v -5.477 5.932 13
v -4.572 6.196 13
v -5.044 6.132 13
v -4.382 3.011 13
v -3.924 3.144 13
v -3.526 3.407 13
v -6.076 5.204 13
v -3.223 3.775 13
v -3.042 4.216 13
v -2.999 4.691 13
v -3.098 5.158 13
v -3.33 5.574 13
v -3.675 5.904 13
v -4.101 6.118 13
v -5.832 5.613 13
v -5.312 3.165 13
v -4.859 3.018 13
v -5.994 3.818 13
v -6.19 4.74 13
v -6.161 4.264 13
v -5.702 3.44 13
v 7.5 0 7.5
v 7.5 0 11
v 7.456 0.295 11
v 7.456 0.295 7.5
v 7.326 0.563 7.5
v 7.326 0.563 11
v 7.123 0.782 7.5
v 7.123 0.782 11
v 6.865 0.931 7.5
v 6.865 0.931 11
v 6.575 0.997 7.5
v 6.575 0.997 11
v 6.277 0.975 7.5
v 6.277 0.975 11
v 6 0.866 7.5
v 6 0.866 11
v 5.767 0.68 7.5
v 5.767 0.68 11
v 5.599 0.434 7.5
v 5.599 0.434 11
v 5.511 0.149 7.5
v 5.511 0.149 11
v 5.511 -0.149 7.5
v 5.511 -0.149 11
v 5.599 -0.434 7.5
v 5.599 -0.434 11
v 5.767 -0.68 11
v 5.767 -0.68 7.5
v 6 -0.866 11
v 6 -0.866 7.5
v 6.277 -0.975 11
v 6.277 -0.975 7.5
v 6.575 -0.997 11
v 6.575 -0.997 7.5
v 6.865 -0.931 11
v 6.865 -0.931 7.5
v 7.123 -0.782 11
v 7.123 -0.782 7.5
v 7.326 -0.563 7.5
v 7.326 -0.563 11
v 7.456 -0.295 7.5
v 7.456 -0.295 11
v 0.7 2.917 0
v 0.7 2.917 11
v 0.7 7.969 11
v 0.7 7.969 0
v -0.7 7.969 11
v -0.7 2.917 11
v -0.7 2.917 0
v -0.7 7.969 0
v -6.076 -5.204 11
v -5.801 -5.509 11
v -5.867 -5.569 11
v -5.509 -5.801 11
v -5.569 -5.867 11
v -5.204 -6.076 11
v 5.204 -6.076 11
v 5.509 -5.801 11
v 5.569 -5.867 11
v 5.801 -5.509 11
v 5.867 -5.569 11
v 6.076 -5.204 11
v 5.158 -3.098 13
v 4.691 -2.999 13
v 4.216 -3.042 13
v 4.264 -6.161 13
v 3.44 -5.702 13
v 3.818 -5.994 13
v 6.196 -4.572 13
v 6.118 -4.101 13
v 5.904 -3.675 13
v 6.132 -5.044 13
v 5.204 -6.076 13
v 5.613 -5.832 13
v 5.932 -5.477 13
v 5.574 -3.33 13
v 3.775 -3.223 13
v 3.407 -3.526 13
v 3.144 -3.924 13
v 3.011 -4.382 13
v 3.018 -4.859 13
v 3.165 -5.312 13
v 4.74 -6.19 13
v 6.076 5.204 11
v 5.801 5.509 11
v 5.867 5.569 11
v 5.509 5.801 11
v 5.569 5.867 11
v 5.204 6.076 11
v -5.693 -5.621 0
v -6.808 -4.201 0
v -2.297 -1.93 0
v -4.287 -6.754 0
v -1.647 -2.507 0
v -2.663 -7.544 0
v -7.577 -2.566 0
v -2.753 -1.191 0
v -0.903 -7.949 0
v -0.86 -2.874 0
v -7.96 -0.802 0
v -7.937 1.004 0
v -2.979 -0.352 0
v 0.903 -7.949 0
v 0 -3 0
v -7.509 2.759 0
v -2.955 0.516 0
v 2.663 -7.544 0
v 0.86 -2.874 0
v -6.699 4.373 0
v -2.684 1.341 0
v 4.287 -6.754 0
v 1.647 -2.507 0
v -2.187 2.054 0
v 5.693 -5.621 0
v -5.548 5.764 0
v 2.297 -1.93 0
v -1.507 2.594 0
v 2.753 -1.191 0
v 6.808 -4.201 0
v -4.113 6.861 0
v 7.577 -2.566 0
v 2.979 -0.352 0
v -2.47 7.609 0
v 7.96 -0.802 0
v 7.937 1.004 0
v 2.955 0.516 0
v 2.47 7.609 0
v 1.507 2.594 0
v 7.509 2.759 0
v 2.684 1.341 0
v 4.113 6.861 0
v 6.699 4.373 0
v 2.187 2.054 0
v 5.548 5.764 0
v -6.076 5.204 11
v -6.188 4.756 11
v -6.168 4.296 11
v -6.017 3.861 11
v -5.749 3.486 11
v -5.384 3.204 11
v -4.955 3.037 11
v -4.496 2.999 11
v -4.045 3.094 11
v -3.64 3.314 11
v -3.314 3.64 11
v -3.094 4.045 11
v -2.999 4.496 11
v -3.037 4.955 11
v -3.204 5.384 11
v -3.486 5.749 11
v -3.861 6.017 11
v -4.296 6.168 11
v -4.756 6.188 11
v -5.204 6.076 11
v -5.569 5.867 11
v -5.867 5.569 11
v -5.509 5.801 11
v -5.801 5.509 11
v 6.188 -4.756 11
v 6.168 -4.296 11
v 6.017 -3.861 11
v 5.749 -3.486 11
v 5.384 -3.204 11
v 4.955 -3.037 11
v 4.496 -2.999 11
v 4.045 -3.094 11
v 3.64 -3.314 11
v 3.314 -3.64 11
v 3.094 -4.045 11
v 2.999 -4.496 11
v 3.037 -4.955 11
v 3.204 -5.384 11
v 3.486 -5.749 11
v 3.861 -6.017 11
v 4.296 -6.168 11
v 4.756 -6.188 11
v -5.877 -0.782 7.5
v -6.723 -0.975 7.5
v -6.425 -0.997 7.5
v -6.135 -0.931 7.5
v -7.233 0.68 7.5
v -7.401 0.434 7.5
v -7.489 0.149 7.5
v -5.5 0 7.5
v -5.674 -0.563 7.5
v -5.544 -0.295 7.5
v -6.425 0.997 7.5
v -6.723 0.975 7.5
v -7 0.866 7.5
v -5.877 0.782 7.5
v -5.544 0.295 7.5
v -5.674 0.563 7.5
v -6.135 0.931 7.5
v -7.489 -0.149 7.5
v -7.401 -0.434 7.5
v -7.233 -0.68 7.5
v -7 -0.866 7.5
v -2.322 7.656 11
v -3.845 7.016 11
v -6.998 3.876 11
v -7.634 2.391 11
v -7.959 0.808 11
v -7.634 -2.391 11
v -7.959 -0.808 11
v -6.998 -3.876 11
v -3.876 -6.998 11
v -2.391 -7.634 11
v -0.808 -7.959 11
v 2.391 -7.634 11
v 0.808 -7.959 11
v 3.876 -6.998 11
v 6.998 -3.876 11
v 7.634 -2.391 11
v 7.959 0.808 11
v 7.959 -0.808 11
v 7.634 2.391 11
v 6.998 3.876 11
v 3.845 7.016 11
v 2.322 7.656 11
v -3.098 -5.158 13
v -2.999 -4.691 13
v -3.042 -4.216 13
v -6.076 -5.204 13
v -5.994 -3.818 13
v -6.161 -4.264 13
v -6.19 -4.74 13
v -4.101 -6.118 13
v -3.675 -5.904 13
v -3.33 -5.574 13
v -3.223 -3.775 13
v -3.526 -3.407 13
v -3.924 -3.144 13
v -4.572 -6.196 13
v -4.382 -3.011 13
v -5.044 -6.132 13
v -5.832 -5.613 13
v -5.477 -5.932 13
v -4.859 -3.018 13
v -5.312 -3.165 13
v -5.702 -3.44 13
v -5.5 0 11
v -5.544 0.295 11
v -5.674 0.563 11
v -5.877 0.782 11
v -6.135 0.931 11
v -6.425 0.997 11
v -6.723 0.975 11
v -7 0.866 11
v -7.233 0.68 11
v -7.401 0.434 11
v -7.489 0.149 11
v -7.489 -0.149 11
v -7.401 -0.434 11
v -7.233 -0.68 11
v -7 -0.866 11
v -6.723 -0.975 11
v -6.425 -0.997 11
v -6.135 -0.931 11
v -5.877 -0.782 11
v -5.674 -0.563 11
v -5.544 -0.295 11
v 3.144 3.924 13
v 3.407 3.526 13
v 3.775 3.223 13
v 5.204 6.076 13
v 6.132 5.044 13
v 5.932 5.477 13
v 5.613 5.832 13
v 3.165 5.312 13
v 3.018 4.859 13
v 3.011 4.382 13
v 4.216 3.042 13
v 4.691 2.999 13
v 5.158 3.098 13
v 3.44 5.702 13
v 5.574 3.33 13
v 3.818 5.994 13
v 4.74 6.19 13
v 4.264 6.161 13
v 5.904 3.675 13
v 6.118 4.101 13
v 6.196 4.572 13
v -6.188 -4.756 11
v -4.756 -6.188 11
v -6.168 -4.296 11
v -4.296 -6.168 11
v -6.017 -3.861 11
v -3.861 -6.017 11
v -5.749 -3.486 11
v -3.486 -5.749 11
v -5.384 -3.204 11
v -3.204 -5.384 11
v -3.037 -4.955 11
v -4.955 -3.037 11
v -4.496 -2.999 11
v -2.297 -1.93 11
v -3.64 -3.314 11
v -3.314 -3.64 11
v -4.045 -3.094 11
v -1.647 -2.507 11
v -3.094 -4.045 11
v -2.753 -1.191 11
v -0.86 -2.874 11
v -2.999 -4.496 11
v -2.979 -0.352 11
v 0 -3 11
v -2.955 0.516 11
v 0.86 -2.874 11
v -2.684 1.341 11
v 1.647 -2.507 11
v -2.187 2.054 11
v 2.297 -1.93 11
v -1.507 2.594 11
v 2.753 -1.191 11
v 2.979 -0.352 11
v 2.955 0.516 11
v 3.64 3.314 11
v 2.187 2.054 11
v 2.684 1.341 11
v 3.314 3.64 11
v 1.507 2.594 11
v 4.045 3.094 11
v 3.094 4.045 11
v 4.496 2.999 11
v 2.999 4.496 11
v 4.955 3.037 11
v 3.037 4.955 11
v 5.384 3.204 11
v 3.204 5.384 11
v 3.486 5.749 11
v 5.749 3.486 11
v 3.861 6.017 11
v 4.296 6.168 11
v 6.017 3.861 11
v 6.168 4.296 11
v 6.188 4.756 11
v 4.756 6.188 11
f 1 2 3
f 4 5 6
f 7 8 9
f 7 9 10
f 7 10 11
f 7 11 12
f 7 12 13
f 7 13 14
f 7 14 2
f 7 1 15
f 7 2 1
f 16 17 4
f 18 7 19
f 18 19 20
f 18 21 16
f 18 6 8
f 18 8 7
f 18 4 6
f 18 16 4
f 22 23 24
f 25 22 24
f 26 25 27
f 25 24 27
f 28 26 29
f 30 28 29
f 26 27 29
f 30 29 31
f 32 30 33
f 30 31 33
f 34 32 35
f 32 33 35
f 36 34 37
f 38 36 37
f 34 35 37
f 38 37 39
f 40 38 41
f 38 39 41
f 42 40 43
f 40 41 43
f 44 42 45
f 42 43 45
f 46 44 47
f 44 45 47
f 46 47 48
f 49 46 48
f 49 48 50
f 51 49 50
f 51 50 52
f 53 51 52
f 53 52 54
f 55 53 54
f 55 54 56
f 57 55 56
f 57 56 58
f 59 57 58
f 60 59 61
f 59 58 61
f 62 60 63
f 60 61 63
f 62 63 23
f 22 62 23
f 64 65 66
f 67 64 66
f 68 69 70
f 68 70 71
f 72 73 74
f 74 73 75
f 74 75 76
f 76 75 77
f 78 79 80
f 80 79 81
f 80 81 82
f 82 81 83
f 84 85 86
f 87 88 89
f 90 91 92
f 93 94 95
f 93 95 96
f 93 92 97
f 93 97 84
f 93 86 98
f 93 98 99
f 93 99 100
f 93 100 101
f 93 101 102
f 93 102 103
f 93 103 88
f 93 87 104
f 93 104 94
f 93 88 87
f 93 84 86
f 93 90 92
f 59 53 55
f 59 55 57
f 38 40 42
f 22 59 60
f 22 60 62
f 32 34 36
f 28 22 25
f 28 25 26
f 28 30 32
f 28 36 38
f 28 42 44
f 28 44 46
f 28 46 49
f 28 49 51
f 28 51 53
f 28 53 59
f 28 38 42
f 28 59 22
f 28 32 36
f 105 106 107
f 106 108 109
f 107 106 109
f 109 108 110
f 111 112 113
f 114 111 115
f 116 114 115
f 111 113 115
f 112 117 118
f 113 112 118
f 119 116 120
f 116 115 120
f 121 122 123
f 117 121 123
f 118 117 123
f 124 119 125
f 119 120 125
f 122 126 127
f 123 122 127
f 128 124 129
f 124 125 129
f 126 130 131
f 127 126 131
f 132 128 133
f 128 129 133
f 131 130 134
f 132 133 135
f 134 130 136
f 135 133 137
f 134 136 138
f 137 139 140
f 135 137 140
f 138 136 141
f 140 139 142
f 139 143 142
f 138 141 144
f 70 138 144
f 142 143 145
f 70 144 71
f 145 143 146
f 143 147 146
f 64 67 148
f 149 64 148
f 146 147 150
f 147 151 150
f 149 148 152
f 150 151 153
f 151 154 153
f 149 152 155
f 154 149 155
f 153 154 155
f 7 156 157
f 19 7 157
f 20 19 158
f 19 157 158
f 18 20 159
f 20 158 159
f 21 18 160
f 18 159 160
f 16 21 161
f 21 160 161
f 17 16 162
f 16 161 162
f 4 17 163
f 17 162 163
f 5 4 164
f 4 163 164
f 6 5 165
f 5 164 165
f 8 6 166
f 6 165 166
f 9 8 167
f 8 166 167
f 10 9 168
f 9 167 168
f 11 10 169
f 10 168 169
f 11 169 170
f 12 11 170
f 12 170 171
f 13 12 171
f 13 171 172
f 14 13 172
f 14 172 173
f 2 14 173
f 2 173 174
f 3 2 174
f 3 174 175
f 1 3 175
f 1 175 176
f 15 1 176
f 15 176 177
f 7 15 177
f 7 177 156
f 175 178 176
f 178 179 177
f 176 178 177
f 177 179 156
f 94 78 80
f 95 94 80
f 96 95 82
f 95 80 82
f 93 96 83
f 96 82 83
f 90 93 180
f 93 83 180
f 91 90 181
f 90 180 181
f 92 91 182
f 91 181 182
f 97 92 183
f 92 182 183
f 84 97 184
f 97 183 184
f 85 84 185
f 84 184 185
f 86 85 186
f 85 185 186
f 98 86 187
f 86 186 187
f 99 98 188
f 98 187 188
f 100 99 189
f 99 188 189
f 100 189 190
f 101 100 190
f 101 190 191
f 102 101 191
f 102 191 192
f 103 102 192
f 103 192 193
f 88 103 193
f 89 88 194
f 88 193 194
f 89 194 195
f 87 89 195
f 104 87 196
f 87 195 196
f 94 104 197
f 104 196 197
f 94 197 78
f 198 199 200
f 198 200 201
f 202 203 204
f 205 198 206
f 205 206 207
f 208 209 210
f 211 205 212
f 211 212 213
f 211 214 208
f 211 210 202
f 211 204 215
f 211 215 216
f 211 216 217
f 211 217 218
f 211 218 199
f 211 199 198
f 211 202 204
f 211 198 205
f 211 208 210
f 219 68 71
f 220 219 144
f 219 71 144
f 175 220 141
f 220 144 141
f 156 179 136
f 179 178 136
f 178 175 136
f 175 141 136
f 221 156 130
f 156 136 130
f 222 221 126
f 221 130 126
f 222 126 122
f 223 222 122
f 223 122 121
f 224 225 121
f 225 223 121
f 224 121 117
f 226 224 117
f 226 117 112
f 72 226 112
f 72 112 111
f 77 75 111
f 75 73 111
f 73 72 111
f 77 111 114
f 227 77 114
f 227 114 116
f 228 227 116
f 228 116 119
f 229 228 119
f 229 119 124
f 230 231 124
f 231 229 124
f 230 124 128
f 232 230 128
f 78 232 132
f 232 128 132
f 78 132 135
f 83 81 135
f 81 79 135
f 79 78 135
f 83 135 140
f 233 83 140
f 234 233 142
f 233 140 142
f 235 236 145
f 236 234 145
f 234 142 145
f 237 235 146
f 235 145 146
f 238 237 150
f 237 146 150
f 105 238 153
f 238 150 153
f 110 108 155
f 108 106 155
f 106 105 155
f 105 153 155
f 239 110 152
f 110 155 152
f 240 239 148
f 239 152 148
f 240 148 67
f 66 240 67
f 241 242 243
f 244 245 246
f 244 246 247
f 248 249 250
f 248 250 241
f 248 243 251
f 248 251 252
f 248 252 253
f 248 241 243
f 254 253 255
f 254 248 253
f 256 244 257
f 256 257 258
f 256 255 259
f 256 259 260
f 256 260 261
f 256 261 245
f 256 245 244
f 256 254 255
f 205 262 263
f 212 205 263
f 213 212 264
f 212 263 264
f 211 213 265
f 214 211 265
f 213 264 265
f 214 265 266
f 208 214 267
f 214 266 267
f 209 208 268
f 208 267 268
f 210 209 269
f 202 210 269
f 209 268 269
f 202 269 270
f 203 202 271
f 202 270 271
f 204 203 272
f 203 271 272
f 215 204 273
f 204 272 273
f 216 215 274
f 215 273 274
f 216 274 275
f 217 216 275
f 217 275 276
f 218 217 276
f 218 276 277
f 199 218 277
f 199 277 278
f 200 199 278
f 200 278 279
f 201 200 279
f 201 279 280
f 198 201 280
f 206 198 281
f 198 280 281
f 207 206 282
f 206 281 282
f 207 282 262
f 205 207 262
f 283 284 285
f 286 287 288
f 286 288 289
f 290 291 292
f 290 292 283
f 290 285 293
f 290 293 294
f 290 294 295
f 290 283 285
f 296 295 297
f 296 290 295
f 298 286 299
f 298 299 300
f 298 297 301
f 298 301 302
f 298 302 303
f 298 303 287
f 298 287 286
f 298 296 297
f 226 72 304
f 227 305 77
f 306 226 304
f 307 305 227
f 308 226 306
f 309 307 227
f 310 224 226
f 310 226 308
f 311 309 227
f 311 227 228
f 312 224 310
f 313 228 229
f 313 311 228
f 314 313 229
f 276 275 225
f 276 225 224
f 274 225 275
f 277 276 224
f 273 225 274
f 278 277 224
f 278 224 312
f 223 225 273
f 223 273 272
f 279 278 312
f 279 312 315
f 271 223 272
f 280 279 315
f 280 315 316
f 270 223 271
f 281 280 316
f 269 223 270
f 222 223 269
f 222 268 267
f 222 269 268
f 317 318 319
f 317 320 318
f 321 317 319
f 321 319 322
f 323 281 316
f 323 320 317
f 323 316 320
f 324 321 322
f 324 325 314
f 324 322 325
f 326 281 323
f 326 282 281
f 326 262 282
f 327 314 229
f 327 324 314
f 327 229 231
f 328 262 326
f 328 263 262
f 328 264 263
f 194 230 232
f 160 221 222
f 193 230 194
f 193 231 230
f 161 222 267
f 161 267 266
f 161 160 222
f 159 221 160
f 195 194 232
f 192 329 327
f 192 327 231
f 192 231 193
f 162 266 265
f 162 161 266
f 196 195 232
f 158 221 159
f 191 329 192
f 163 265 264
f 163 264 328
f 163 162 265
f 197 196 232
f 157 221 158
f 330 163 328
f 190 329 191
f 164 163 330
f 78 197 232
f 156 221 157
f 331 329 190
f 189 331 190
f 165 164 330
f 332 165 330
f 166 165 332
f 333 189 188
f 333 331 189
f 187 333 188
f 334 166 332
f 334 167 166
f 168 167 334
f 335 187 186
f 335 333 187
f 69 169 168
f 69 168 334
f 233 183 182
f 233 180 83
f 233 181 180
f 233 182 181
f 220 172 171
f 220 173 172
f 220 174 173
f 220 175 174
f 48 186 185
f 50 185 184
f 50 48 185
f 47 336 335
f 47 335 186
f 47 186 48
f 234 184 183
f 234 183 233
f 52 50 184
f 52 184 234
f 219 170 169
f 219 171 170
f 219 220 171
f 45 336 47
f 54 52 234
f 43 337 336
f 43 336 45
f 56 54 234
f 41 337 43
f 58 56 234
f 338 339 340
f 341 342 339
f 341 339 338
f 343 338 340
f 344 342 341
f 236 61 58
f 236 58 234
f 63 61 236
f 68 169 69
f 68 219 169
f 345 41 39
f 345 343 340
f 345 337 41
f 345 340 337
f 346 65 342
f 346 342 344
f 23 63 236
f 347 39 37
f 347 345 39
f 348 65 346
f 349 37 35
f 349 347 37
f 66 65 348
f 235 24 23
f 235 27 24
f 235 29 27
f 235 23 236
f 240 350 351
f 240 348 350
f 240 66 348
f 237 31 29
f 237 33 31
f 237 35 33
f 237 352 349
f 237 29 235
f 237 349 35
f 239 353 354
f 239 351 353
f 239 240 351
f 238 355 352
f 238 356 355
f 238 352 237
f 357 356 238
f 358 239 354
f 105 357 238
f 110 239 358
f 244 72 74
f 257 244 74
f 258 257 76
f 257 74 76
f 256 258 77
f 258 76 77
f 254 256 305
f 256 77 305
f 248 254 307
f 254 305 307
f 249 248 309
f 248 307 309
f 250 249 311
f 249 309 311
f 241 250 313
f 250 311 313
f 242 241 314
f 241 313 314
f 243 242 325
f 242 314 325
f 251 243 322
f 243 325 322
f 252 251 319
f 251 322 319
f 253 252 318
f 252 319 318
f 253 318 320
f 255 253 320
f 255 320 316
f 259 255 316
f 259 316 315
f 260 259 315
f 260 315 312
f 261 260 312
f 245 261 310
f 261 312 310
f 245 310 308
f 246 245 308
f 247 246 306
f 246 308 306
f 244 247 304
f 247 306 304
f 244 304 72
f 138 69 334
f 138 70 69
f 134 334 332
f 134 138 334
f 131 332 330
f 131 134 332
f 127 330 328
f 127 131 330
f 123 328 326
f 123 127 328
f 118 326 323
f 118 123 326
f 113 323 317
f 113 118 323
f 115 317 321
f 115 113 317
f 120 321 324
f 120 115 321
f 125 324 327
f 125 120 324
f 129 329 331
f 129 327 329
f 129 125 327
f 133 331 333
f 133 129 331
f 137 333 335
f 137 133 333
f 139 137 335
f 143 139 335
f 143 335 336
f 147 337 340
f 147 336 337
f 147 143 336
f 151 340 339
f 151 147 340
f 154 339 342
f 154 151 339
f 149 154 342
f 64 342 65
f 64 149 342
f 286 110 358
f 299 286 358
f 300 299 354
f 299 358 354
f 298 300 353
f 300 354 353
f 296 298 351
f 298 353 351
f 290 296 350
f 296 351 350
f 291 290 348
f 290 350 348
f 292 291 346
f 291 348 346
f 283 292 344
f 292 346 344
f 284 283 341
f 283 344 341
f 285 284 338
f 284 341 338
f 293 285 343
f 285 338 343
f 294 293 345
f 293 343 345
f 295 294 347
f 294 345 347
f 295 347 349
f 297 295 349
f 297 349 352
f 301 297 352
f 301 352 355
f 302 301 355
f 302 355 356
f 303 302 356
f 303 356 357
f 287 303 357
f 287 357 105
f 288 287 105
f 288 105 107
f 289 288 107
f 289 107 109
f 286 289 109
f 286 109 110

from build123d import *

# Parameters (mm, degrees)
SKETCH_1_R          = 8
SKETCH_1_R_2        = 3
EXTRUDE_1_DEPTH     = 11
SKETCH_2_W          = 1.4
SKETCH_2_H          = 7.329379883
CUT_EXTRUDE_1_DEPTH = 13.5
SKETCH_3_R          = 1
CUT_EXTRUDE_2_DEPTH = 3.5
SKETCH_4_R          = 1.6
EXTRUDE_3_DEPTH     = 2


with BuildPart() as part:
    # 草图1 → 凸台-拉伸1 (new body)
    with BuildSketch(Plane.XY):
        Circle(SKETCH_1_R)
        Circle(SKETCH_1_R_2, mode=Mode.SUBTRACT)
    extrude(amount=EXTRUDE_1_DEPTH)

    # 草图2 → 切除-拉伸1 (cut)
    with BuildSketch(Plane.XY.offset(11)):
        with Locations((0, 5.87801753)):
            Rectangle(SKETCH_2_W, SKETCH_2_H)
    extrude(amount=-CUT_EXTRUDE_1_DEPTH, mode=Mode.SUBTRACT)

    # 草图3 → 切除-拉伸2 (cut)
    with BuildSketch(Plane.XY.offset(11)):
        with Locations((6.5, 0)):
            Circle(SKETCH_3_R)
        with Locations((-6.5, 0)):
            Circle(SKETCH_3_R)
    extrude(amount=-CUT_EXTRUDE_2_DEPTH, mode=Mode.SUBTRACT)

    # 草图4 → 凸台-拉伸3 (add)
    with BuildSketch(Plane.XY.offset(11)):
        with Locations(Location((4.596194078, 4.596194078, 0), (0, 0, 67.691377582))):
            Circle(SKETCH_4_R)
        with Locations(Location((4.596194078, -4.596194078, 0), (0, 0, 292.308622418))):
            Circle(SKETCH_4_R)
        with Locations(Location((-4.596194078, -4.596194078, 0), (0, 0, 202.308622418))):
            Circle(SKETCH_4_R)
        with Locations(Location((-4.596194078, 4.596194078, 0), (0, 0, 157.691377582))):
            Circle(SKETCH_4_R)
    extrude(amount=EXTRUDE_3_DEPTH)


solid = part.part
